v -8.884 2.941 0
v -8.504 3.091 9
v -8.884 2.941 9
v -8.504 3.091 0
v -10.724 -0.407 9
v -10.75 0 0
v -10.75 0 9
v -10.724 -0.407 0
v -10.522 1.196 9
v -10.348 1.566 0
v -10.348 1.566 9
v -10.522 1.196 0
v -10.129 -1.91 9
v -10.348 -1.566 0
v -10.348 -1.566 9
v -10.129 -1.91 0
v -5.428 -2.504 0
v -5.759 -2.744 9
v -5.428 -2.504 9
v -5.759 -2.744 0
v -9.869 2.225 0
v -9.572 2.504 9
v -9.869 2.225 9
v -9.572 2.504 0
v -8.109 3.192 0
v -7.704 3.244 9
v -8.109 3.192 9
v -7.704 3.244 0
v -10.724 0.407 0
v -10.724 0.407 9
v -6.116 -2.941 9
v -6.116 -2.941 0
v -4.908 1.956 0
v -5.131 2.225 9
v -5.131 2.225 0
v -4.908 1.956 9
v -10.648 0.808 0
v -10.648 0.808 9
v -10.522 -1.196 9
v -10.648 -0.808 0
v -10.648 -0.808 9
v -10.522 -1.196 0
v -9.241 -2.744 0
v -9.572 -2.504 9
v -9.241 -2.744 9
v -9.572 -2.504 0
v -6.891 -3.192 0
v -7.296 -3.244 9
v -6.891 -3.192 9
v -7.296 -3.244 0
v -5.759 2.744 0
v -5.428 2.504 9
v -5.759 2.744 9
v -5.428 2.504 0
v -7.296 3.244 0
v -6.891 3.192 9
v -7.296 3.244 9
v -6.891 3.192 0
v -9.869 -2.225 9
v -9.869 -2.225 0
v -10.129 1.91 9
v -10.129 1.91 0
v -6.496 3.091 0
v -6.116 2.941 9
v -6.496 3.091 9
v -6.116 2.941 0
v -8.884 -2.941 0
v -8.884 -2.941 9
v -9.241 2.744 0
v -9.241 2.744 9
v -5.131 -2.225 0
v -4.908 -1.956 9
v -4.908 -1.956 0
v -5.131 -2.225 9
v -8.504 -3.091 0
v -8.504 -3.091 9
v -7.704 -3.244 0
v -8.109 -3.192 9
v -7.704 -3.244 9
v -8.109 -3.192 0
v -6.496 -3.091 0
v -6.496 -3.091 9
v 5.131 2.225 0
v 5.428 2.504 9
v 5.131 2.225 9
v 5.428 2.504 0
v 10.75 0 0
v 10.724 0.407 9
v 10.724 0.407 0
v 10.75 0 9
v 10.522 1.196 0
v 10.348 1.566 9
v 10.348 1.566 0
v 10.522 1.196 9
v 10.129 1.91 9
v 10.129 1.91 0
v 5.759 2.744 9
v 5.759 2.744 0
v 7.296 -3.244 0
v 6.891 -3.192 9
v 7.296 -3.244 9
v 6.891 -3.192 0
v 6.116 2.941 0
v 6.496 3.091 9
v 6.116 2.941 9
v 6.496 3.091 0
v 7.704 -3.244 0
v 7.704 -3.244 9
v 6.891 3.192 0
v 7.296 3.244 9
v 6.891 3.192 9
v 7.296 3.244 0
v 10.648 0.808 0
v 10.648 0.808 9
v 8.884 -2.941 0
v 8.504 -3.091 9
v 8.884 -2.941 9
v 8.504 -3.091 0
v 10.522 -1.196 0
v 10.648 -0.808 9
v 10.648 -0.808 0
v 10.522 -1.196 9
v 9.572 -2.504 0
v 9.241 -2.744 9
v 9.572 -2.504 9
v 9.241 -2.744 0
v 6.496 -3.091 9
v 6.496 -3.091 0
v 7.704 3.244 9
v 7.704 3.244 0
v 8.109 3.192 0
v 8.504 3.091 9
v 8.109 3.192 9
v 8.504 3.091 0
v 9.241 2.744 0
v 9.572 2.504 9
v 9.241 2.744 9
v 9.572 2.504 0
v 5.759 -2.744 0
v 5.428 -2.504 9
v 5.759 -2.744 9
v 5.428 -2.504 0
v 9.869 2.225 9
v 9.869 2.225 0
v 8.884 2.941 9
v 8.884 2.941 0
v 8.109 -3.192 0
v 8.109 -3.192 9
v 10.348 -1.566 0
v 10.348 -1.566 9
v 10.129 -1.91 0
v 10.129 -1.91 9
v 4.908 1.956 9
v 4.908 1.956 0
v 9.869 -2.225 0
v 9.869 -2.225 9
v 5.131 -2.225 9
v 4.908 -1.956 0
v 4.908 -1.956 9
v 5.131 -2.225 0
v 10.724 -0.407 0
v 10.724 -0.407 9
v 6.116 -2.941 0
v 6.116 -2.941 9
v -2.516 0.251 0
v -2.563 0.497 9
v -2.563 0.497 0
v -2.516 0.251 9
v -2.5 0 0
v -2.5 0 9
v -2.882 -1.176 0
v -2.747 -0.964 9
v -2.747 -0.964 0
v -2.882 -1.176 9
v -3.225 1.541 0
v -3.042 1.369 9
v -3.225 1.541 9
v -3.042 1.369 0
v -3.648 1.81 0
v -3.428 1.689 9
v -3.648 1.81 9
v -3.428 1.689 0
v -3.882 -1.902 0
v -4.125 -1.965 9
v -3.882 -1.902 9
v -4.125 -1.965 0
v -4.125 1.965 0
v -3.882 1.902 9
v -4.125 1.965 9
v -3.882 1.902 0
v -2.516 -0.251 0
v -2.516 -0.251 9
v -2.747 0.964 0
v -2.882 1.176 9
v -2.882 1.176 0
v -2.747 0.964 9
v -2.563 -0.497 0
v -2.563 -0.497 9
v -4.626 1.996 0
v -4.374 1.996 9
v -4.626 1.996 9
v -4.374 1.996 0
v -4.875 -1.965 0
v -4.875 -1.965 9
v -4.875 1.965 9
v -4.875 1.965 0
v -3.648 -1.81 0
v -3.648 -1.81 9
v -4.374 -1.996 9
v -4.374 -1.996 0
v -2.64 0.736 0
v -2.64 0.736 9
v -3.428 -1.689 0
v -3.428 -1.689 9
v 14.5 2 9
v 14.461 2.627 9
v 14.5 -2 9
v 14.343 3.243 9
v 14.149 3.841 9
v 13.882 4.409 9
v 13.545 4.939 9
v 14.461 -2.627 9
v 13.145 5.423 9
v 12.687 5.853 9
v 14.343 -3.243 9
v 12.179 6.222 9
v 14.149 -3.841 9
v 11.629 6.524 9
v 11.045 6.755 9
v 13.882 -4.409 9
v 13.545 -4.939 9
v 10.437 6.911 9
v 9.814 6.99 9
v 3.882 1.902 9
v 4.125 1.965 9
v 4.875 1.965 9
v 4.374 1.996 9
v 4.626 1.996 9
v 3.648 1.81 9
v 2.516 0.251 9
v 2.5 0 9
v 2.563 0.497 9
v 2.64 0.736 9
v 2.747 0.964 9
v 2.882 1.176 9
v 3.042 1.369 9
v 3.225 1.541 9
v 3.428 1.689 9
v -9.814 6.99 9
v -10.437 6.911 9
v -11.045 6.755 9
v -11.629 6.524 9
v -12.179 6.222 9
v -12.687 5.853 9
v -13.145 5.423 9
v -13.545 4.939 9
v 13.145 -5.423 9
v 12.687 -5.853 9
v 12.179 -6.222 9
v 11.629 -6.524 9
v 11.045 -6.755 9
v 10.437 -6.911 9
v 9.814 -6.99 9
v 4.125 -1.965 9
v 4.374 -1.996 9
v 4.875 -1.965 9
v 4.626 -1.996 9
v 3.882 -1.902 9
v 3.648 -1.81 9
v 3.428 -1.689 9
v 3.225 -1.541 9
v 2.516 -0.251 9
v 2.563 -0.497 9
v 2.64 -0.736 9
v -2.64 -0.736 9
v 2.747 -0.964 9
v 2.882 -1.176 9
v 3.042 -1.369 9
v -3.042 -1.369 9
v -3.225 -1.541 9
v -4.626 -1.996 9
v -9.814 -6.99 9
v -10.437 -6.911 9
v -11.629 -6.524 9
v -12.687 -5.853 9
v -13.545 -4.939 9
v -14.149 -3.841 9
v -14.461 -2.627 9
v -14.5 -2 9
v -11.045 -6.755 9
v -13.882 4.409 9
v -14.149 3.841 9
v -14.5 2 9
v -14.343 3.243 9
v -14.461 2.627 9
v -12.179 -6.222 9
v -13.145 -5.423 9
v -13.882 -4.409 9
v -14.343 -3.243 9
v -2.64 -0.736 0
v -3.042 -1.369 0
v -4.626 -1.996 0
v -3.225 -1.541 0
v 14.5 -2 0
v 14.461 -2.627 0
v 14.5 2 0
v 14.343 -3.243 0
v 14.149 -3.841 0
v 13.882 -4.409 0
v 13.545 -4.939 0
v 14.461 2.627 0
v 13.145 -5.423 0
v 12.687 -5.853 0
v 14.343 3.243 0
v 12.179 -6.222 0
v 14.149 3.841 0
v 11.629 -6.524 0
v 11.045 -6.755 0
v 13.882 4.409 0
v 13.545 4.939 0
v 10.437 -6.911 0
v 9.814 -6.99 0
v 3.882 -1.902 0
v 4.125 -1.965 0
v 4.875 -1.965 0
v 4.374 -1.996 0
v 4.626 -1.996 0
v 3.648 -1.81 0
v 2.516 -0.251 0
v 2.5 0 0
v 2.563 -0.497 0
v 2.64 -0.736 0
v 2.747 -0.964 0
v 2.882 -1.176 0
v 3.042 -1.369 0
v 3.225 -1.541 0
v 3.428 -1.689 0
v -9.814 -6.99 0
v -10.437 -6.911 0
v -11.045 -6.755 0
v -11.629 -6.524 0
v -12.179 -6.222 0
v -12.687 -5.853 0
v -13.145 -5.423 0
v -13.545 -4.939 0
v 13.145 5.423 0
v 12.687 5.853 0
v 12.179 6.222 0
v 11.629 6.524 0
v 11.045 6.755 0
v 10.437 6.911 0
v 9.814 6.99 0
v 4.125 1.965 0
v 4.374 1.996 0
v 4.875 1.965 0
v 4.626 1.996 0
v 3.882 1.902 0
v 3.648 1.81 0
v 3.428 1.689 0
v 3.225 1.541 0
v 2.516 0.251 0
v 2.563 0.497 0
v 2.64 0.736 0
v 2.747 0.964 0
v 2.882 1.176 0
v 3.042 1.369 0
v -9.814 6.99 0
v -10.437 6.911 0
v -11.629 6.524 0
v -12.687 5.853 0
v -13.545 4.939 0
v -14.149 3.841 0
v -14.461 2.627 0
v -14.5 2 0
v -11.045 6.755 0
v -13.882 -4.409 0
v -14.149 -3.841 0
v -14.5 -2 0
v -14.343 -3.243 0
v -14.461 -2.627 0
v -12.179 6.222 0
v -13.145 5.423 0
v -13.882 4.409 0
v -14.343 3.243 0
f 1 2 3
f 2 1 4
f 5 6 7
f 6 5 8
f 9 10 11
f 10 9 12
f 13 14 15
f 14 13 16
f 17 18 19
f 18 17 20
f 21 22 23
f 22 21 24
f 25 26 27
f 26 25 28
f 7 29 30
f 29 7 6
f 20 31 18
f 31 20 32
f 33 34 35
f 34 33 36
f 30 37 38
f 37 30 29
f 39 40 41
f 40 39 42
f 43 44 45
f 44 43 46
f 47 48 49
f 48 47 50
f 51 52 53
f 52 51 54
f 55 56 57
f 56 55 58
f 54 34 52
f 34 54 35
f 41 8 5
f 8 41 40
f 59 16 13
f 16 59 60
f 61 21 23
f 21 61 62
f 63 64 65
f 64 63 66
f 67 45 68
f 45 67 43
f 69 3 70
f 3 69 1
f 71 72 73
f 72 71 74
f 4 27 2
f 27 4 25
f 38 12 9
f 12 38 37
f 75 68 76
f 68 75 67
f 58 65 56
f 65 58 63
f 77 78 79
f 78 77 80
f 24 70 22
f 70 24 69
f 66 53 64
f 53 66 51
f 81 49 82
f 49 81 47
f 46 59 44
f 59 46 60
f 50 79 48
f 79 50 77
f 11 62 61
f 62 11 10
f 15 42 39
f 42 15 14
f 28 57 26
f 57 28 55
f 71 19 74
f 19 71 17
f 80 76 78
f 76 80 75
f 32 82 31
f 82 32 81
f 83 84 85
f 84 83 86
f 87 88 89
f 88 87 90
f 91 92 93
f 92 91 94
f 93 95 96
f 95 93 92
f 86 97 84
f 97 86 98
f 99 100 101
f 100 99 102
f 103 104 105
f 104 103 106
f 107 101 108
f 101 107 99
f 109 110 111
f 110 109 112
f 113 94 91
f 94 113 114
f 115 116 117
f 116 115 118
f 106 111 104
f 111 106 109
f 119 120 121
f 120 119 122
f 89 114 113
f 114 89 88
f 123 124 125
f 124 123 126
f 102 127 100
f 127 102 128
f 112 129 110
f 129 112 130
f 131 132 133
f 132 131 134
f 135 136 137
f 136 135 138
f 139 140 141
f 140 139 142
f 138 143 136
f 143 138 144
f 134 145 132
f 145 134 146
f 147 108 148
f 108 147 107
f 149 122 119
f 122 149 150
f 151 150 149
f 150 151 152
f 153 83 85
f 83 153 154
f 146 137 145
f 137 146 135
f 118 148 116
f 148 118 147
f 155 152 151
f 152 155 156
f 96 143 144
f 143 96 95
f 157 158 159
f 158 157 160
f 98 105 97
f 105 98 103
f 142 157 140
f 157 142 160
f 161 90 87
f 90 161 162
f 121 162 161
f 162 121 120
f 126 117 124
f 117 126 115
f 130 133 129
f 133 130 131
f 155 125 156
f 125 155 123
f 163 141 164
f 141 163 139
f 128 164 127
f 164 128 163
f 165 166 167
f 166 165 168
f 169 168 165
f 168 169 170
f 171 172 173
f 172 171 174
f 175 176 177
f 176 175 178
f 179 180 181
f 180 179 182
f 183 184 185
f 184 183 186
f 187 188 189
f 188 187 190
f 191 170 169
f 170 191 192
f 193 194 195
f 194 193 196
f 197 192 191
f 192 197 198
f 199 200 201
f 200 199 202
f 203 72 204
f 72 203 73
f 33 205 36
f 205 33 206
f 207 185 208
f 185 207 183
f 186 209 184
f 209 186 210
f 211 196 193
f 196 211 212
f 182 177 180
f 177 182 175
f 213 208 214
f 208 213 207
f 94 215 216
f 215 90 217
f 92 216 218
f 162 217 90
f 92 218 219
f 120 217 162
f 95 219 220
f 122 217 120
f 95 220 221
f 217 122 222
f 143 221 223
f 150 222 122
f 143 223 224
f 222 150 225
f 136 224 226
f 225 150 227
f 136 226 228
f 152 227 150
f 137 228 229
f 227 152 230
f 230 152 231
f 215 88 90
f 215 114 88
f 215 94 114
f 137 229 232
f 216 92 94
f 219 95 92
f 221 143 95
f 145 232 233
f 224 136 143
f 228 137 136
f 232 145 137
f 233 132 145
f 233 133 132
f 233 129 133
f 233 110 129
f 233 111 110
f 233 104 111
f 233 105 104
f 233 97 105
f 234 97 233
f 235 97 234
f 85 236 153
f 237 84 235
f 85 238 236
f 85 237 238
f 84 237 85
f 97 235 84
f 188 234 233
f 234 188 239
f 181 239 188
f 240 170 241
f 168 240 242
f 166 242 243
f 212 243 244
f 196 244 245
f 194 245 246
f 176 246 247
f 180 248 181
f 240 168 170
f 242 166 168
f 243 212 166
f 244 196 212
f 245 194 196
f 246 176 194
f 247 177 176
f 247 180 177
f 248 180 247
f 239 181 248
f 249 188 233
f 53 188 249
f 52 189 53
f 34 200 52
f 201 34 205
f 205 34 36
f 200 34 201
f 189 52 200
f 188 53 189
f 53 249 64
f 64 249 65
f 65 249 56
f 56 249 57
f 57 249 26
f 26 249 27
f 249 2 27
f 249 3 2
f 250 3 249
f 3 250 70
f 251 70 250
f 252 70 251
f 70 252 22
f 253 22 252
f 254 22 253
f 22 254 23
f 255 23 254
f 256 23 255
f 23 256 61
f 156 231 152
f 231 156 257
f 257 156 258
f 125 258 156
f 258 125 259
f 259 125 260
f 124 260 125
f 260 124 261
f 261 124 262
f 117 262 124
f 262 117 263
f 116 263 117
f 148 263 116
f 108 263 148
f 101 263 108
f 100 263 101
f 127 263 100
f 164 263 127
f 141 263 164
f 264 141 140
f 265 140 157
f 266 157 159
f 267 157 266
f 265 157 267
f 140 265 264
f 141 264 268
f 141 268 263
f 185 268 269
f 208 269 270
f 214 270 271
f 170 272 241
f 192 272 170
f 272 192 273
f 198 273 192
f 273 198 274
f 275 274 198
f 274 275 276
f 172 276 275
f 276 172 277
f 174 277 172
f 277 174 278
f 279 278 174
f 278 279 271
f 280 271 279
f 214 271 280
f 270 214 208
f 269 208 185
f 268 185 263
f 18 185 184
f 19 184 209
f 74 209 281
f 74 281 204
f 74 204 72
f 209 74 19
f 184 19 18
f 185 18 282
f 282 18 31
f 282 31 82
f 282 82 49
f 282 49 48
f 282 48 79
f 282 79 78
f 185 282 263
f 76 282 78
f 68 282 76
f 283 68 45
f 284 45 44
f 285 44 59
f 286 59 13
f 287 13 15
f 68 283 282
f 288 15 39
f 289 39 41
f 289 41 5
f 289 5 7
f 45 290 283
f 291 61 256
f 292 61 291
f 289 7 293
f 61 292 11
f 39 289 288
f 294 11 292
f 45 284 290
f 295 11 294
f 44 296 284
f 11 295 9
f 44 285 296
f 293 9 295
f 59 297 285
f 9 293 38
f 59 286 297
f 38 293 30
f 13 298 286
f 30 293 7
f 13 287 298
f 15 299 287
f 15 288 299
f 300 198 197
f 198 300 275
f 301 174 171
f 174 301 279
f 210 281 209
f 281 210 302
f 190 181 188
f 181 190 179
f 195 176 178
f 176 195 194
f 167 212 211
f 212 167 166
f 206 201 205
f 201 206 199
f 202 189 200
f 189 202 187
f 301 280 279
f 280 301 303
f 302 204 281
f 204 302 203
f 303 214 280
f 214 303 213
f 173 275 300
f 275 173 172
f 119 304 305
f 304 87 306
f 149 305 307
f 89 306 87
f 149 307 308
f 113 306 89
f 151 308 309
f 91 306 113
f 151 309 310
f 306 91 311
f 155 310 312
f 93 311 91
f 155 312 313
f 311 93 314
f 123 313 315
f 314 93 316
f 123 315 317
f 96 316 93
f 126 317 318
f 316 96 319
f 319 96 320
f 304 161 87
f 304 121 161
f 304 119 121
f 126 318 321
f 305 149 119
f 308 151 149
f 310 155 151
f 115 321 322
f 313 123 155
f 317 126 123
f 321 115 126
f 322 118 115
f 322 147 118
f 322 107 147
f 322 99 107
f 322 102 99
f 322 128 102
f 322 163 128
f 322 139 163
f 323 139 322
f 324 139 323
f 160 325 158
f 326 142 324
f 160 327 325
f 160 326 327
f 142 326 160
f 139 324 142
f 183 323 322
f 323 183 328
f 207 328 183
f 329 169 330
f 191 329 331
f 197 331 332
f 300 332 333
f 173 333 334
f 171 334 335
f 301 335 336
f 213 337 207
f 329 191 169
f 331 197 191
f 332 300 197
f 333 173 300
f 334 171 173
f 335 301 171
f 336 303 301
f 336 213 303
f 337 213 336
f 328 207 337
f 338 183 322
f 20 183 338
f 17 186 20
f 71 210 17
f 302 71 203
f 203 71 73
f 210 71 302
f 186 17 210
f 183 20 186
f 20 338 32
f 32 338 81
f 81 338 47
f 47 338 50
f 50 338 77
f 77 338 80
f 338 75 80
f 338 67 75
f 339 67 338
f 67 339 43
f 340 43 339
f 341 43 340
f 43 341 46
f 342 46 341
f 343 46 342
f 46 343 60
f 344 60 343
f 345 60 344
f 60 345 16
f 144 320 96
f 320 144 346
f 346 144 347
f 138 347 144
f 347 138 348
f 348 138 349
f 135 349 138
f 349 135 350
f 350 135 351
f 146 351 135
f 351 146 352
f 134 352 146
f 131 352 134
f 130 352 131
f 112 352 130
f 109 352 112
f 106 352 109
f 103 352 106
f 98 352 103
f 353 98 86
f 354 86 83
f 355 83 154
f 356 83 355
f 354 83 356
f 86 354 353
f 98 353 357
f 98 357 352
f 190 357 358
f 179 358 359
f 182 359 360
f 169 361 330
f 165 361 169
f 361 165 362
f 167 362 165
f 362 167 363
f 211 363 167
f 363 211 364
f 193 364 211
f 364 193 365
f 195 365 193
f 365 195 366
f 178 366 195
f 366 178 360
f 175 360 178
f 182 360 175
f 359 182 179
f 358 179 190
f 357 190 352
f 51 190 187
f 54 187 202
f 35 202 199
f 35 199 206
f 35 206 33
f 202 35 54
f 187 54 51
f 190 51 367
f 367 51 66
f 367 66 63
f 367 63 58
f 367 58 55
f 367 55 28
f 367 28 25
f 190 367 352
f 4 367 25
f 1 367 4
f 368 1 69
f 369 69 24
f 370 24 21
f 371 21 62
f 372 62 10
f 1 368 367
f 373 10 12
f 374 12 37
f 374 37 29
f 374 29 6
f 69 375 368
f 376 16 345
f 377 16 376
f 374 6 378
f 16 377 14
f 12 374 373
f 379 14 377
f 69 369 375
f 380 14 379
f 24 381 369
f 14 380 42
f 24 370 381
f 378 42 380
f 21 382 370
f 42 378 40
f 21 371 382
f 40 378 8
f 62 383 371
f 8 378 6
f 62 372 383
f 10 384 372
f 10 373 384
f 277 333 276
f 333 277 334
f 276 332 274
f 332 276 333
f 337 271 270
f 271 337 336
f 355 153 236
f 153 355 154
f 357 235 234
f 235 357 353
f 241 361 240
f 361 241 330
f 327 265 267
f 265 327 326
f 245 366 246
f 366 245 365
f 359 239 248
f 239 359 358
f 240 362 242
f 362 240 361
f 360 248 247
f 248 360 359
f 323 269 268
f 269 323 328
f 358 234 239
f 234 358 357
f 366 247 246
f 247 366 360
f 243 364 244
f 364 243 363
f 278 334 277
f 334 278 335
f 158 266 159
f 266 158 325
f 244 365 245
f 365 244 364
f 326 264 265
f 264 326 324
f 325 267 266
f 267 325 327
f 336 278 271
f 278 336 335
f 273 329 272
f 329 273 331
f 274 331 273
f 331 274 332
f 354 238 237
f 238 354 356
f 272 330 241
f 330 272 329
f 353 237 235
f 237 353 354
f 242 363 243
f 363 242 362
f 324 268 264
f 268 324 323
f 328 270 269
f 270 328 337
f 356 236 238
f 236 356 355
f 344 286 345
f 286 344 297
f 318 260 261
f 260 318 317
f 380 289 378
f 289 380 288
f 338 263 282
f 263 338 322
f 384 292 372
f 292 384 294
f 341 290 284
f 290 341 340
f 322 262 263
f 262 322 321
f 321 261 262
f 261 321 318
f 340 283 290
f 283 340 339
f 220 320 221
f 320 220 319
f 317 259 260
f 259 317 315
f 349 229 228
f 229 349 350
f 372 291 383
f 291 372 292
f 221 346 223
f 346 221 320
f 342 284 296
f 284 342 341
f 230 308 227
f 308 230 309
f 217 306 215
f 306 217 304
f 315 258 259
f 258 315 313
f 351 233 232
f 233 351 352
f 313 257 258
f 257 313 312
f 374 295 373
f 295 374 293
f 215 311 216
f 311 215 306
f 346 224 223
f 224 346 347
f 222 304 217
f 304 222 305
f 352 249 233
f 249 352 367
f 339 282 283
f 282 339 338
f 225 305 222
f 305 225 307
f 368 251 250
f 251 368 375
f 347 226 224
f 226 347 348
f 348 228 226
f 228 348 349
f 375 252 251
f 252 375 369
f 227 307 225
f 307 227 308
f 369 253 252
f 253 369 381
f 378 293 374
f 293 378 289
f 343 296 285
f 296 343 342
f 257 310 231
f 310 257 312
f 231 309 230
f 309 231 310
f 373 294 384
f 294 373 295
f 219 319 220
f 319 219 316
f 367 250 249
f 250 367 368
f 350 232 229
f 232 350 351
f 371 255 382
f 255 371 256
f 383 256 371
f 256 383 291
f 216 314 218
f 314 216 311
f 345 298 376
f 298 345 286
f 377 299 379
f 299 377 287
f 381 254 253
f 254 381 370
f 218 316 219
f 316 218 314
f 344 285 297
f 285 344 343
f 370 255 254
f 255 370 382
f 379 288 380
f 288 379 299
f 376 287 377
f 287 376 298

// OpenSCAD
$fn = 50;

difference() {
	union() {
		hull() {
			translate(v = [-9.5, 2.0, 0]) {
				cylinder(h = 9, r = 5);
			}
			translate(v = [9.5, 2.0, 0]) {
				cylinder(h = 9, r = 5);
			}
			translate(v = [-9.5, -2.0, 0]) {
				cylinder(h = 9, r = 5);
			}
			translate(v = [9.5, -2.0, 0]) {
				cylinder(h = 9, r = 5);
			}
		}
	}
	union() {
		translate(v = [-7.5, 0.0, -100.0]) {
			cylinder(h = 200, r = 3.25);
		}
		translate(v = [7.5, 0.0, -100.0]) {
			cylinder(h = 200, r = 3.25);
		}
		translate(v = [-7.5, 0.0, -100.0]) {
			cylinder(h = 200, r = 1.8);
		}
		translate(v = [7.5, 0.0, -100.0]) {
			cylinder(h = 200, r = 1.8);
		}
		translate(v = [-4.5, 0, 0.0]) {
			cylinder(h = 9, r = 2.0);
		}
		translate(v = [4.5, 0, 0.0]) {
			cylinder(h = 9, r = 2.0);
		}
	}
}
